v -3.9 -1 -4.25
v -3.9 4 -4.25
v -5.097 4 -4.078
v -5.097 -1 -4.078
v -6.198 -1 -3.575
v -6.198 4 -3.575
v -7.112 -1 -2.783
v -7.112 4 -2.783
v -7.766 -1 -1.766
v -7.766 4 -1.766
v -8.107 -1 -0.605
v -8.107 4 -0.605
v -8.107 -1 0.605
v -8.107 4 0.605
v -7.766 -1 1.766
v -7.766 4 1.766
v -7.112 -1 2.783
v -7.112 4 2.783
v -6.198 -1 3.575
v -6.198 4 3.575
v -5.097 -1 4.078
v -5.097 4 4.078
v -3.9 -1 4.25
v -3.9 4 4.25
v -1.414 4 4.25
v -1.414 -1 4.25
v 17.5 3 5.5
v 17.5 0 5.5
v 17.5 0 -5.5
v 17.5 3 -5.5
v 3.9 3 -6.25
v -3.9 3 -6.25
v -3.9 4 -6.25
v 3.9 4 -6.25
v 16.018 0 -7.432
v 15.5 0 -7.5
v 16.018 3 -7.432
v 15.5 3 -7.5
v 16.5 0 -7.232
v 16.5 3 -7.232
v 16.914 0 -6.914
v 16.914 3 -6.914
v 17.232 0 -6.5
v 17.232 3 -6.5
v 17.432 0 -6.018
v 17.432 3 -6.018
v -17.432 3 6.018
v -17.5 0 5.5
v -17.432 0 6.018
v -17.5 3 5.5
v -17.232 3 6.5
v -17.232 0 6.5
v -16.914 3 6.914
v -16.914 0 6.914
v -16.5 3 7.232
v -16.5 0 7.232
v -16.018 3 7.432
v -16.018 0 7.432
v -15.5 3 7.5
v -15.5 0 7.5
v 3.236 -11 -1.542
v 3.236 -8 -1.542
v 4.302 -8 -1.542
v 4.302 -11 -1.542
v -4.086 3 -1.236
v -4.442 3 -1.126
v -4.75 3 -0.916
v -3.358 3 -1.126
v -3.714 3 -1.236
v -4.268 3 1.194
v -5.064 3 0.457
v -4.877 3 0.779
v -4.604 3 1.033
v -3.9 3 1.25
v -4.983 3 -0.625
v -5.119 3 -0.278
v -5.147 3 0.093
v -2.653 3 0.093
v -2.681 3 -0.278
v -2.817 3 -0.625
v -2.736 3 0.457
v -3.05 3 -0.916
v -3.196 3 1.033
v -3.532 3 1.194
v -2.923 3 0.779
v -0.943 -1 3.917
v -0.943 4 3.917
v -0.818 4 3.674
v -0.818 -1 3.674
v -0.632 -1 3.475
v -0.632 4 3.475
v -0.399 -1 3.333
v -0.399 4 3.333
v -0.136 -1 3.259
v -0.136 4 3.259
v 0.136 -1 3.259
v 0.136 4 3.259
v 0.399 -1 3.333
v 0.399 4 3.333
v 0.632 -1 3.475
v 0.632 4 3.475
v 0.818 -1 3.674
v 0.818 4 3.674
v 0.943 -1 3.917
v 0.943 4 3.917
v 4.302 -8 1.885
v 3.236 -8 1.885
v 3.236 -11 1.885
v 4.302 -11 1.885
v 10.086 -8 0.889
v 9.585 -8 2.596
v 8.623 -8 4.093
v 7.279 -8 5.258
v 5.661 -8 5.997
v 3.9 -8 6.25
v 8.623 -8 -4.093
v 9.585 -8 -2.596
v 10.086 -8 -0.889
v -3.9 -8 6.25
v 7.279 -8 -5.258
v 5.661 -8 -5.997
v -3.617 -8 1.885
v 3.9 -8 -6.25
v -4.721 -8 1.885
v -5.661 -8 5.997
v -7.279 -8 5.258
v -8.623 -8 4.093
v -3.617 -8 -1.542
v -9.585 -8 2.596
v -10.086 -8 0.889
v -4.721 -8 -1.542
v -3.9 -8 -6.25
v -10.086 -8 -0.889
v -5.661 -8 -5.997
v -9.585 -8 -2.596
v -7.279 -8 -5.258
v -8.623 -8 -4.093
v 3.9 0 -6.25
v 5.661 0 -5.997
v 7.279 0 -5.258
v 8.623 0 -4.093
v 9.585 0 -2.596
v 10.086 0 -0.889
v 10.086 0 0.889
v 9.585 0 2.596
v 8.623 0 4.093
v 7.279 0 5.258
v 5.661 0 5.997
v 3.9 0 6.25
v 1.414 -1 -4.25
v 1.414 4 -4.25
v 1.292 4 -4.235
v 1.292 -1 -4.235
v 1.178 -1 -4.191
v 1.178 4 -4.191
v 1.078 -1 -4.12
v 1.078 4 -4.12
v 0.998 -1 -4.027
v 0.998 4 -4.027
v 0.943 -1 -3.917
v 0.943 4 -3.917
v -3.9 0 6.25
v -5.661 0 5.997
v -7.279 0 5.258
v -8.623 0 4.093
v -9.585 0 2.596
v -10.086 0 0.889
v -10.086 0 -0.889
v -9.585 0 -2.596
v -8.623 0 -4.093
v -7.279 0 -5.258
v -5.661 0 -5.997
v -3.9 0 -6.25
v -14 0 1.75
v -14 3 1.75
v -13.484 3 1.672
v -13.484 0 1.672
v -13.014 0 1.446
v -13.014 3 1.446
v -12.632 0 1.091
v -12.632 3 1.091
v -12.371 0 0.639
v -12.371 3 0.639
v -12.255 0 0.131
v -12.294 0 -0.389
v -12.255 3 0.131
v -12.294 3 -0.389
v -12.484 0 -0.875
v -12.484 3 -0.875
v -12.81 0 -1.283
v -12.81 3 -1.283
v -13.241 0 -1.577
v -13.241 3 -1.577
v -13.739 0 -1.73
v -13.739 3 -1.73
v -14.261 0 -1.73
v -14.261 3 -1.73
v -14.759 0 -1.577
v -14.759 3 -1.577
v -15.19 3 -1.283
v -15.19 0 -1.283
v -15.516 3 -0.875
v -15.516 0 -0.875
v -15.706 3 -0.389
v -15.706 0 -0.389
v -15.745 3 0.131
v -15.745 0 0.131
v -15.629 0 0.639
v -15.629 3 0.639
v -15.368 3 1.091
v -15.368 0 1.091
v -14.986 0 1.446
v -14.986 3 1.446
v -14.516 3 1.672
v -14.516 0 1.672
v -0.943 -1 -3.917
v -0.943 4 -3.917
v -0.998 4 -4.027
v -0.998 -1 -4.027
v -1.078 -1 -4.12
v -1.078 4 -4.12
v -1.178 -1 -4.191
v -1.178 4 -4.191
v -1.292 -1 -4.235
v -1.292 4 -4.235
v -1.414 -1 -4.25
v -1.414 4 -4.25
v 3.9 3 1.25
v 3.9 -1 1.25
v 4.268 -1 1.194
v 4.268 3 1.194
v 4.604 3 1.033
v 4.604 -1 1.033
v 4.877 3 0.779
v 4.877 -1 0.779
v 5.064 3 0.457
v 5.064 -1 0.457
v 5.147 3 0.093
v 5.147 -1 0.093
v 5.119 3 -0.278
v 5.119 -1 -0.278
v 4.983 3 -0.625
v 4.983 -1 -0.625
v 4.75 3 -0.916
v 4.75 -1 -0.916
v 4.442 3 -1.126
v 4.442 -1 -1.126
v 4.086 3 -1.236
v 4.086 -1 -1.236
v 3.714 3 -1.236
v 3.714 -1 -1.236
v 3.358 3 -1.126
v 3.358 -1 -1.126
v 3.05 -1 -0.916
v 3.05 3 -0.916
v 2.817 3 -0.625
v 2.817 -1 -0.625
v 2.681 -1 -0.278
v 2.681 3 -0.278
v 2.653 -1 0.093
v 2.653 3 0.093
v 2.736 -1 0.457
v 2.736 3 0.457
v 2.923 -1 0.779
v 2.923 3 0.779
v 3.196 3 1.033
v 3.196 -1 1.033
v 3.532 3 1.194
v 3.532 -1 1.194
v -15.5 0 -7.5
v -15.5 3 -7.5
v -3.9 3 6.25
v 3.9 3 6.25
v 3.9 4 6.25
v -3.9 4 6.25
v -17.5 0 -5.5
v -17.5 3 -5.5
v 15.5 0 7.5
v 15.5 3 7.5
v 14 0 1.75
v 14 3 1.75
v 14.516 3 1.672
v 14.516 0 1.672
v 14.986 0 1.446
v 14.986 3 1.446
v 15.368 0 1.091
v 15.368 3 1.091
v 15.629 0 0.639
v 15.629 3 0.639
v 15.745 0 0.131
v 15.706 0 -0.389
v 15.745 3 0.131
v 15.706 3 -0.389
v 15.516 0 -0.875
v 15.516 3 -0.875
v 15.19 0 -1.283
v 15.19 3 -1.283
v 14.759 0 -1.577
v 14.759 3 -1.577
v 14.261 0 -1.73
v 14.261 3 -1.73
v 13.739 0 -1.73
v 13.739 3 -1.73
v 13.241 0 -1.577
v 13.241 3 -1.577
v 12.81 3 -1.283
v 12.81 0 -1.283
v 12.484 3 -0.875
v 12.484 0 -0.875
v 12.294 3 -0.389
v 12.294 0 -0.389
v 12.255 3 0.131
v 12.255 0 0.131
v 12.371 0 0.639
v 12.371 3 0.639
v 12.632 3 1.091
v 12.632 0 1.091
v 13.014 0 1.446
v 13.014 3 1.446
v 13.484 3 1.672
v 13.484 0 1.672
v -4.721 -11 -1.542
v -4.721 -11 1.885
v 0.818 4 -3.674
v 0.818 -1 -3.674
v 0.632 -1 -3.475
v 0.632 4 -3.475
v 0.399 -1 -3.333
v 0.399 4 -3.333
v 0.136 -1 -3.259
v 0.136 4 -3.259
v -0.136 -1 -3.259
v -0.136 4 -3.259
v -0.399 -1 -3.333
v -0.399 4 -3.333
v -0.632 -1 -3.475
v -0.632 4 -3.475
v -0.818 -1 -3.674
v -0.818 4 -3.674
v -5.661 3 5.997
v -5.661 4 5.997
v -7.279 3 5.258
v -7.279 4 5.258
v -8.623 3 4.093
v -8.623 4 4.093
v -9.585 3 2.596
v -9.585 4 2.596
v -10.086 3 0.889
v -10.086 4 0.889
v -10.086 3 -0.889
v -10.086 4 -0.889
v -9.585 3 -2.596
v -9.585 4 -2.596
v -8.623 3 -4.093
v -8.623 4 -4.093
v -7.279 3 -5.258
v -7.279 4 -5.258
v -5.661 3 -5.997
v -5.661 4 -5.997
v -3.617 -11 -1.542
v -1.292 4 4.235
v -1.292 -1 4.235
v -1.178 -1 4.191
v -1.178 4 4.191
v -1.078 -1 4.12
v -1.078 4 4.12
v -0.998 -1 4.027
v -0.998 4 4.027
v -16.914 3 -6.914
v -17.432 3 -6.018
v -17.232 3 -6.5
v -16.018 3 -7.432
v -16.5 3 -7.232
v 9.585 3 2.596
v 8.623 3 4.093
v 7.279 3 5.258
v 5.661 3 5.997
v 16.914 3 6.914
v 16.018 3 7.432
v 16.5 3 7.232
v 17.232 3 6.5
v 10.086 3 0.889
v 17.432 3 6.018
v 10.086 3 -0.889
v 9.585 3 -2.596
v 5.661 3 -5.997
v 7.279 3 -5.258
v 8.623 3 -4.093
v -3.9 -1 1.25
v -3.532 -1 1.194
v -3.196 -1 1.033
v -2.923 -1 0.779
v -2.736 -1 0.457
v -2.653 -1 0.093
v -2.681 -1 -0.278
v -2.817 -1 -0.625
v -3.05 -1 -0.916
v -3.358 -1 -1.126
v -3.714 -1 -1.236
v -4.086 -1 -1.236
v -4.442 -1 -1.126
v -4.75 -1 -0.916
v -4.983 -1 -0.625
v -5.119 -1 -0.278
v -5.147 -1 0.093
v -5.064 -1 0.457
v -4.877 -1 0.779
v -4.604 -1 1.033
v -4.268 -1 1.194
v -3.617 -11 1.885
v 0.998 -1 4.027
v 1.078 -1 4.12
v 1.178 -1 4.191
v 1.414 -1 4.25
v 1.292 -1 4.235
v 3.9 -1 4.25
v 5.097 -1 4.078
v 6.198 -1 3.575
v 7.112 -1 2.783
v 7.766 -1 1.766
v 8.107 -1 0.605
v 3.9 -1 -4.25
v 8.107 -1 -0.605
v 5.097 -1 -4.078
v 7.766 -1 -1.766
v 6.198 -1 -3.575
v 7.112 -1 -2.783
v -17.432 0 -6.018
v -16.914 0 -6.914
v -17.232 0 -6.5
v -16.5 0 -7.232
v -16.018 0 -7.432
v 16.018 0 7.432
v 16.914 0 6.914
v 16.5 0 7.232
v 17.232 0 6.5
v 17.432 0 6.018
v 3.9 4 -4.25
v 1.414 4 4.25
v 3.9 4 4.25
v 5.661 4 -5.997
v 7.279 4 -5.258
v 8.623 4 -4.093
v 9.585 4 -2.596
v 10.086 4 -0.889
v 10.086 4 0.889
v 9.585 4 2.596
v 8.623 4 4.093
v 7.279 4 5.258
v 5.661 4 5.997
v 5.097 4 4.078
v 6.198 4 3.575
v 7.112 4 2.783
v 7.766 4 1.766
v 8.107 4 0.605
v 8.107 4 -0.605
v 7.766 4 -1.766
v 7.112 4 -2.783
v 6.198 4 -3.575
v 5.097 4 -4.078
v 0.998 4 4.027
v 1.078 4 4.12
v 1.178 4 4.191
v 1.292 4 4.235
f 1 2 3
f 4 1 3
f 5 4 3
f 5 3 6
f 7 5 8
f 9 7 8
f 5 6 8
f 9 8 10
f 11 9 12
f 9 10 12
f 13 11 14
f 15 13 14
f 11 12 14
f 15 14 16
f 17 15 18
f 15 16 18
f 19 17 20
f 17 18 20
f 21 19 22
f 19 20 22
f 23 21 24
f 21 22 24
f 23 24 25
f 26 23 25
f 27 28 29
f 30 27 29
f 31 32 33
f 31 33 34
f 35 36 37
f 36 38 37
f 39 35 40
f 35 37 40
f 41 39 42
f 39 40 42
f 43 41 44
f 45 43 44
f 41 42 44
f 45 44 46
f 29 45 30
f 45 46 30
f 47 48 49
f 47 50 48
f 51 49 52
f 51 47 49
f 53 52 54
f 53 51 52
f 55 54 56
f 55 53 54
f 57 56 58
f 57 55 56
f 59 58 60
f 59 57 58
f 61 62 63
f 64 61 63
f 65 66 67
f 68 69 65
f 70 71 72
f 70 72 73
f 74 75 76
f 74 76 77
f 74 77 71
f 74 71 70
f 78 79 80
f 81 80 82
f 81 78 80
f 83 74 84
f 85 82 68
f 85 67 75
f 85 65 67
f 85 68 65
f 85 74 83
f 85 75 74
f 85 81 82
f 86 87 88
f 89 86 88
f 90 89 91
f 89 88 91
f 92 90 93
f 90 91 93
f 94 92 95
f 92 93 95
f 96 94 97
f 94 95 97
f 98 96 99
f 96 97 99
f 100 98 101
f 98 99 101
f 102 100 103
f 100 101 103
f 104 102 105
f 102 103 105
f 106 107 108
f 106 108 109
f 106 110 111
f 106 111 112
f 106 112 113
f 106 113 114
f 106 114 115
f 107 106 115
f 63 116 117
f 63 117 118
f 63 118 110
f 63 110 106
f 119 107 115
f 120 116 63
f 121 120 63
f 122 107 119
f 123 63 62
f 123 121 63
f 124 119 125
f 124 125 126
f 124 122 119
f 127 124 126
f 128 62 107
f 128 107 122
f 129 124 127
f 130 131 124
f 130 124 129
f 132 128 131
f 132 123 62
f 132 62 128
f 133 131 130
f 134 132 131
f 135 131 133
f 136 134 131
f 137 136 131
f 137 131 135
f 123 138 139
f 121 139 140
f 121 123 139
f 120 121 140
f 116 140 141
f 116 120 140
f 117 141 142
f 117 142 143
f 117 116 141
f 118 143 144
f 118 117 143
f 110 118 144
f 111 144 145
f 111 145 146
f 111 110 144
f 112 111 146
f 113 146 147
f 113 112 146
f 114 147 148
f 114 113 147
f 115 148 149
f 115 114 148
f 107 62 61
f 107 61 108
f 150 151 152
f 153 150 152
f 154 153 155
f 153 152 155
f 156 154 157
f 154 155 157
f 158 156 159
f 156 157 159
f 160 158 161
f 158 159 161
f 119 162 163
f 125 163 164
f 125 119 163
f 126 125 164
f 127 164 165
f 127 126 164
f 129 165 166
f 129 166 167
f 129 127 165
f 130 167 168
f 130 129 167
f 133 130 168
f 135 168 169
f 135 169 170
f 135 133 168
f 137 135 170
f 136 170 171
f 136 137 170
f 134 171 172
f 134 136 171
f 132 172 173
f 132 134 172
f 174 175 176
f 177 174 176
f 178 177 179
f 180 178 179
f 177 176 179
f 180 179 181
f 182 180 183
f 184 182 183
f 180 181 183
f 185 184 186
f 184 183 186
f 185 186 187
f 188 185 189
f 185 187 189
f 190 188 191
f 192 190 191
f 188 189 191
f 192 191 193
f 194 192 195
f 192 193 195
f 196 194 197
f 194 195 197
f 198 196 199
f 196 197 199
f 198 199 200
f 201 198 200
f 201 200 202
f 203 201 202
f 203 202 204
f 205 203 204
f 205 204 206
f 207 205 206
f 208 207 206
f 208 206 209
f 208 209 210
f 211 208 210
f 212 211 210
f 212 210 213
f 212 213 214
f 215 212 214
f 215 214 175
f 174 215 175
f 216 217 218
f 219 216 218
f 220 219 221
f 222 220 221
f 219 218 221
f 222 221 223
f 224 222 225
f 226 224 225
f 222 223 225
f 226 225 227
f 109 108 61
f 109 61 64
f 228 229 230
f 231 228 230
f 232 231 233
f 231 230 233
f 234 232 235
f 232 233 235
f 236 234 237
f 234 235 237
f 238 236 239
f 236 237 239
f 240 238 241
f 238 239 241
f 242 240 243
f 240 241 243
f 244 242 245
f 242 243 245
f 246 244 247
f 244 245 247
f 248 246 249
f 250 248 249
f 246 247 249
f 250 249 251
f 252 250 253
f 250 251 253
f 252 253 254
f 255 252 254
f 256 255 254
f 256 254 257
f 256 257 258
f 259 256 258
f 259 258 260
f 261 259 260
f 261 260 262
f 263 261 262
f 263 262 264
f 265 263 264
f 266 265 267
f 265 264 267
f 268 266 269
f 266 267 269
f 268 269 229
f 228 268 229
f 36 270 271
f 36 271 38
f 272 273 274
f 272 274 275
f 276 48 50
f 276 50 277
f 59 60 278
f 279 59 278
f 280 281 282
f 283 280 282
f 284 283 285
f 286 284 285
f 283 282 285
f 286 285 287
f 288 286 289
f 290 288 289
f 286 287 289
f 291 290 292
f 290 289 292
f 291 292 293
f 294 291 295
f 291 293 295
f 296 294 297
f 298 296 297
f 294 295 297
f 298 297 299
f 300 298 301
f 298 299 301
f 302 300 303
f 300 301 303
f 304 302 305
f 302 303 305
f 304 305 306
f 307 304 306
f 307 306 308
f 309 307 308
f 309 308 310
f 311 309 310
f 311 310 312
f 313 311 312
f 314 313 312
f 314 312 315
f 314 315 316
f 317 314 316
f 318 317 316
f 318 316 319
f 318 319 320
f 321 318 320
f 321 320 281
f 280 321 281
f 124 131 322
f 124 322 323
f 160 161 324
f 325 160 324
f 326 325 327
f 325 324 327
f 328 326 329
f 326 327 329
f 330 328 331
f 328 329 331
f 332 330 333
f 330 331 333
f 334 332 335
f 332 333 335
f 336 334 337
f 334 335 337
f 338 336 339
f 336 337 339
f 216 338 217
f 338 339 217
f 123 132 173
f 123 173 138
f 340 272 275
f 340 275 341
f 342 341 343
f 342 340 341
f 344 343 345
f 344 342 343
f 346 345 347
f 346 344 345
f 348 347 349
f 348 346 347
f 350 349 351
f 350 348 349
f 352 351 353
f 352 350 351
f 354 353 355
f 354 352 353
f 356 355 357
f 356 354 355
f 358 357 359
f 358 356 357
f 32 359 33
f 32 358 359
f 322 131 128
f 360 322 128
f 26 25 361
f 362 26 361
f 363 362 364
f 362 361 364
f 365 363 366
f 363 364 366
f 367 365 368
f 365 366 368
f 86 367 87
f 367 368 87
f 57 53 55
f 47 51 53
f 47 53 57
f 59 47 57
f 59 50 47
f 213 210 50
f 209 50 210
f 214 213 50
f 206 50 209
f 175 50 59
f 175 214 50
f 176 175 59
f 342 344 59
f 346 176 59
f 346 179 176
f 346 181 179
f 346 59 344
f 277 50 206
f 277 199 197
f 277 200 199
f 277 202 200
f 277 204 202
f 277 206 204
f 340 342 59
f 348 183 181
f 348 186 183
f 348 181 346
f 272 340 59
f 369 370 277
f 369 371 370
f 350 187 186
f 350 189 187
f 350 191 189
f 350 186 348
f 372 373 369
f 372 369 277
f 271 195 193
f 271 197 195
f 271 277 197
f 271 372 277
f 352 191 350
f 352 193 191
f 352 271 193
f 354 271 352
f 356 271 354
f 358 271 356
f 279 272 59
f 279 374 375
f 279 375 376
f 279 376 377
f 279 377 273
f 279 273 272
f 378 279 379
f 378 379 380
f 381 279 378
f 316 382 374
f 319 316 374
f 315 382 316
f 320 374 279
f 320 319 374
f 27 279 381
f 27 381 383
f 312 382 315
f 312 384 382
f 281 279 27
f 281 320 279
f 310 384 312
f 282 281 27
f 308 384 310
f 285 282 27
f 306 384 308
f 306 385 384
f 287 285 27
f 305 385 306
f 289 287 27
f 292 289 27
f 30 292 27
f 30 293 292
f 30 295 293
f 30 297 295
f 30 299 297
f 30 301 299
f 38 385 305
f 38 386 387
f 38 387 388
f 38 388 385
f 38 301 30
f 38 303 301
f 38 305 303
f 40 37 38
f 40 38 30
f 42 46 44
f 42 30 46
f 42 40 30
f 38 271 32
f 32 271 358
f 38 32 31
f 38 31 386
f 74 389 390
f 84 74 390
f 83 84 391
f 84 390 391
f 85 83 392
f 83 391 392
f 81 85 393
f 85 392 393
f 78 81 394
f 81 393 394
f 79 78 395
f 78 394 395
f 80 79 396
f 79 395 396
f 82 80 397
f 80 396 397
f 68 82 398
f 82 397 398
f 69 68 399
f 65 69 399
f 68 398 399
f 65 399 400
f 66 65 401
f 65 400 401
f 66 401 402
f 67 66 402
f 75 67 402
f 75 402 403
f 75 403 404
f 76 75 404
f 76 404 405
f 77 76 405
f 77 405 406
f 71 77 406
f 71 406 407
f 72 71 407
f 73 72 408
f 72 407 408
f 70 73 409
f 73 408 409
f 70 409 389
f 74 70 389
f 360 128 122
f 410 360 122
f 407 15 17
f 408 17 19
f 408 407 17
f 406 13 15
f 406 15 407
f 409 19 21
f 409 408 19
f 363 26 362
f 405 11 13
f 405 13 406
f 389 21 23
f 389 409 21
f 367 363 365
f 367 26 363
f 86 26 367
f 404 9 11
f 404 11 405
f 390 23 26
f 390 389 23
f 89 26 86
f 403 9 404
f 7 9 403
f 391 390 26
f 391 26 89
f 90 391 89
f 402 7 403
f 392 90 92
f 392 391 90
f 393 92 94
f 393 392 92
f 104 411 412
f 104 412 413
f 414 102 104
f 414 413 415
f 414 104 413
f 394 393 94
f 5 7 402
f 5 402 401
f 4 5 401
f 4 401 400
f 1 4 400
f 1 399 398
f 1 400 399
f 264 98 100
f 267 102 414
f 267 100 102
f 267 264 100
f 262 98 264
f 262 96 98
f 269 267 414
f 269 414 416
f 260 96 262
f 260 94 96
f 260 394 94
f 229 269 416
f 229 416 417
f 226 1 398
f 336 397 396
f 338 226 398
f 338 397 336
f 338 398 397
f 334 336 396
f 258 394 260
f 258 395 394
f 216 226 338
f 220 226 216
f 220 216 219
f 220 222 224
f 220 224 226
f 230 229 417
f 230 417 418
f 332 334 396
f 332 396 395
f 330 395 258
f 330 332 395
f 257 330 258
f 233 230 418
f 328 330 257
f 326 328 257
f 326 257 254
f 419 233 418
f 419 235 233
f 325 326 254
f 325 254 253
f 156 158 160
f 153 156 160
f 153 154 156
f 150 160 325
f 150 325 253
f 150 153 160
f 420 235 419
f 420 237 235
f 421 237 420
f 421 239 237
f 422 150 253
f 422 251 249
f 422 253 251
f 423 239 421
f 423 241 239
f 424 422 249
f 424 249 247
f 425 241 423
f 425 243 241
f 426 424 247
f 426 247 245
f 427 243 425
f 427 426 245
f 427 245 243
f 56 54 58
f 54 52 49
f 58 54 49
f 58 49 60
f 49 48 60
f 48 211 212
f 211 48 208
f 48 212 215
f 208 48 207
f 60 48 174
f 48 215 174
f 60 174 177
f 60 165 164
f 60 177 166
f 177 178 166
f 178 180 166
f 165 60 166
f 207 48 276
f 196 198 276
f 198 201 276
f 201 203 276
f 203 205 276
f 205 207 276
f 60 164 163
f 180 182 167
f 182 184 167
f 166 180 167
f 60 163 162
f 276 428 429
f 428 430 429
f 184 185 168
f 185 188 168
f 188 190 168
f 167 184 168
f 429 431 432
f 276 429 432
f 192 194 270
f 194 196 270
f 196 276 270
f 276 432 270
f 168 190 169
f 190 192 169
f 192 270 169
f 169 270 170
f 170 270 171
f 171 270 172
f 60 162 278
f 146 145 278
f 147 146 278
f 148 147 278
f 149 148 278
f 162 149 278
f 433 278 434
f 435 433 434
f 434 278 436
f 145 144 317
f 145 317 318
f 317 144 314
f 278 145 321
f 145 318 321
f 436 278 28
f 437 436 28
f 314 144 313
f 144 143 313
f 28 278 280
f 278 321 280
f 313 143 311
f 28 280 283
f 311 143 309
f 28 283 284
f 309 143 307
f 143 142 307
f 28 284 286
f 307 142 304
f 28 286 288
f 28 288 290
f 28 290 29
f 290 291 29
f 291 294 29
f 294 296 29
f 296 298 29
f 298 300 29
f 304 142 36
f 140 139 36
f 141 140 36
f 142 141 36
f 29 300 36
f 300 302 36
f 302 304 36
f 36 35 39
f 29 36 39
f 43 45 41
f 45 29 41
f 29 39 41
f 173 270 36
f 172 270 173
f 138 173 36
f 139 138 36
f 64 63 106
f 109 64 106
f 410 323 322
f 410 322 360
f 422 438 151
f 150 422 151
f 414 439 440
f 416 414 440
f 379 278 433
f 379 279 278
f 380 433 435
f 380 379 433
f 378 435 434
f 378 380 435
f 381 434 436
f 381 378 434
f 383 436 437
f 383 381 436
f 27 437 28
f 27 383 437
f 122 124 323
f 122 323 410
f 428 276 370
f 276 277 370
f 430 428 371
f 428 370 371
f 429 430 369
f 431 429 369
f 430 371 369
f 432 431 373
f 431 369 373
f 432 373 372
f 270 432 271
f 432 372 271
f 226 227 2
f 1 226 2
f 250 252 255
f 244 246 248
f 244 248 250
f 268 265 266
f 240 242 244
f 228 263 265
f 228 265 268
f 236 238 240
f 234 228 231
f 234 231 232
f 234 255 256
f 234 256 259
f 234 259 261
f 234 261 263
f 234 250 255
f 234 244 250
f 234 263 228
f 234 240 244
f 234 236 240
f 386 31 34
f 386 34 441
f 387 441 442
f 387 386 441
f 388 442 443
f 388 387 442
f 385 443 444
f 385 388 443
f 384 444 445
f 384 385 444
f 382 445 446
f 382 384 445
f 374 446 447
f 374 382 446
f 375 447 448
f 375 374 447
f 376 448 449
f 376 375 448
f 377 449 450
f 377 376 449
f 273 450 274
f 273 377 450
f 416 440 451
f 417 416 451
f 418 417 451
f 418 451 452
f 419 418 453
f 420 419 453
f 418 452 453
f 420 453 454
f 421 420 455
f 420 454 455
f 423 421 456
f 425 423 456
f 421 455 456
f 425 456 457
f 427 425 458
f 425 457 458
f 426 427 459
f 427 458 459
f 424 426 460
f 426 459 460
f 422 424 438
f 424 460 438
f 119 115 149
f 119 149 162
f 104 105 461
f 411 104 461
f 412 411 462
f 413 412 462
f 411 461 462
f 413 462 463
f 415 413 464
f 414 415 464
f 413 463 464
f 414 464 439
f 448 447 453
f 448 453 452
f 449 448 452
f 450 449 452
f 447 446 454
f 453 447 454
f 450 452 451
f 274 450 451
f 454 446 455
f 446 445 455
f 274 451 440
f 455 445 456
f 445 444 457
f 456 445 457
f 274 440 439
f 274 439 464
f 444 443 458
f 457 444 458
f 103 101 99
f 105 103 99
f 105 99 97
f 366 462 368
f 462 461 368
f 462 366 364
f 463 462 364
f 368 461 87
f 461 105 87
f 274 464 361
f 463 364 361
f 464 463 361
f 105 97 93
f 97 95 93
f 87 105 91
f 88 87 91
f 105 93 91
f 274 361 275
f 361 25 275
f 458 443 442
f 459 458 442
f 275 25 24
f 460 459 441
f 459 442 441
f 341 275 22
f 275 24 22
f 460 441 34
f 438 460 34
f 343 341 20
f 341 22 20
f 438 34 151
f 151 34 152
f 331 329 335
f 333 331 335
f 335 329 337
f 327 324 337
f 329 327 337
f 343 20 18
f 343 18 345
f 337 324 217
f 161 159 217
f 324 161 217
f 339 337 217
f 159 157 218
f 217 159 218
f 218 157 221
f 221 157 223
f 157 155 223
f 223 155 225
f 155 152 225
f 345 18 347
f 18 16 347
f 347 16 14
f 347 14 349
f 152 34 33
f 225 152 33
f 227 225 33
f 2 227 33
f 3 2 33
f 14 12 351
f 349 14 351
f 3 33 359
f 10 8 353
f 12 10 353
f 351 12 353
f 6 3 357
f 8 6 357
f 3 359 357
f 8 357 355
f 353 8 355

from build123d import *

# Parameters (mm, degrees)
SKETCH_1_W           = 35
SKETCH_1_H           = 15
EXTRUDE_1_DEPTH      = 3
EXTRUDE_2_DEPTH      = 1
EXTRUDE_2_DEPTH_BACK = 11
SKETCH_3_R           = 1.75
CUT_EXTRUDE_1_DEPTH  = 22.988633427
CUT_EXTRUDE_2_DEPTH  = 5
SKETCH_6_R           = 1.25
EXTRUDE_3_DEPTH      = 4
FILLET_1_R           = 2
SKETCH_7_W           = 1.104079178
SKETCH_7_H           = 3.426452622
SKETCH_7_W_2         = 1.066007483
EXTRUDE_4_DEPTH      = 3


with BuildPart() as part:
    # 草图1 → 凸台-拉伸1 (new body)
    with BuildSketch(Plane(origin=(0, 0, 0), x_dir=(1, 0, 0), z_dir=(0, 1, 0))):
        Rectangle(SKETCH_1_W, SKETCH_1_H)
    extrude(amount=EXTRUDE_1_DEPTH)

    # 草图2 → 凸台-拉伸2 (add, two sides: drawn at the far end of the back side and taken through both)
    with BuildSketch(Plane(origin=(0, 3, 0), x_dir=(1, 0, 0), z_dir=(0, 1, 0)).offset(-EXTRUDE_2_DEPTH_BACK)):
        with BuildLine():
            Line((-3.9, 6.25), (3.9, 6.25))
            ThreePointArc((3.9, 6.25), (10.15, 0), (3.9, -6.25))
            Line((3.9, -6.25), (-3.9, -6.25))
            ThreePointArc((-3.9, -6.25), (-10.15, 0), (-3.9, 6.25))
        make_face()
    extrude(amount=EXTRUDE_2_DEPTH + EXTRUDE_2_DEPTH_BACK)

    # 草图3 → 切除-拉伸1 (cut, through all)
    with BuildSketch(Plane(origin=(0, 3, 0), x_dir=(1, 0, 0), z_dir=(0, 1, 0))):
        with Locations(Location((-14, 0, 0), (0, 0, 270))):
            Circle(SKETCH_3_R)
        with Locations(Location((14, 0, 0), (0, 0, 270))):
            Circle(SKETCH_3_R)
    extrude(amount=-CUT_EXTRUDE_1_DEPTH, mode=Mode.SUBTRACT)

    # 草图5 → 切除-拉伸2 (cut)
    with BuildSketch(Plane(origin=(0, 4, 0), x_dir=(1, 0, 0), z_dir=(0, 1, 0))):
        with BuildLine():
            Line((-1.414213562, 4.25), (-3.9, 4.25))
            ThreePointArc((-3.9, 4.25), (-8.15, 0), (-3.9, -4.25))
            Line((-3.9, -4.25), (-1.414213562, -4.25))
            ThreePointArc((-1.414213562, -4.25), (-1.125538428, -4.15824829), (-0.942809042, -3.916666667))
            ThreePointArc((-0.942809042, -3.916666667), (0, -3.25), (0.942809042, -3.916666667))
            ThreePointArc((0.942809042, -3.916666667), (1.125538428, -4.15824829), (1.414213562, -4.25))
            Line((1.414213562, -4.25), (3.9, -4.25))
            ThreePointArc((3.9, -4.25), (8.15, 0), (3.9, 4.25))
            Line((3.9, 4.25), (1.414213562, 4.25))
            ThreePointArc((1.414213562, 4.25), (1.125538428, 4.15824829), (0.942809042, 3.916666667))
            ThreePointArc((0.942809042, 3.916666667), (0, 3.25), (-0.942809042, 3.916666667))
            ThreePointArc((-0.942809042, 3.916666667), (-1.125538428, 4.15824829), (-1.414213562, 4.25))
        make_face()
    extrude(amount=-CUT_EXTRUDE_2_DEPTH, mode=Mode.SUBTRACT)

    # 草图6 → 凸台-拉伸3 (add)
    with BuildSketch(Plane(origin=(0, -1, 0), x_dir=(1, 0, 0), z_dir=(0, 1, 0))):
        with Locations(Location((-3.9, 0, 0), (0, 0, 270))):
            Circle(SKETCH_6_R)
        with Locations(Location((3.9, 0, 0), (0, 0, 270))):
            Circle(SKETCH_6_R)
    extrude(amount=EXTRUDE_3_DEPTH)

    # 圆角1
    fillet_1_edges = [part.edges().sort_by_distance(p)[0] for p in [
        (17.5, 1.5, 7.5),
        (-17.5, 1.5, 7.5),
        (-17.5, 1.5, -7.5),
        (17.5, 1.5, -7.5),
    ]]
    fillet(fillet_1_edges, radius=FILLET_1_R)

    # 草图7 → 凸台-拉伸4 (add)
    with BuildSketch(Plane.XZ.offset(8)):
        with Locations((-4.16885069, 0.171322631)):
            Rectangle(SKETCH_7_W, SKETCH_7_H)
        with Locations((3.769097885, 0.171322631)):
            Rectangle(SKETCH_7_W_2, SKETCH_7_H)
    extrude(amount=EXTRUDE_4_DEPTH)


solid = part.part
